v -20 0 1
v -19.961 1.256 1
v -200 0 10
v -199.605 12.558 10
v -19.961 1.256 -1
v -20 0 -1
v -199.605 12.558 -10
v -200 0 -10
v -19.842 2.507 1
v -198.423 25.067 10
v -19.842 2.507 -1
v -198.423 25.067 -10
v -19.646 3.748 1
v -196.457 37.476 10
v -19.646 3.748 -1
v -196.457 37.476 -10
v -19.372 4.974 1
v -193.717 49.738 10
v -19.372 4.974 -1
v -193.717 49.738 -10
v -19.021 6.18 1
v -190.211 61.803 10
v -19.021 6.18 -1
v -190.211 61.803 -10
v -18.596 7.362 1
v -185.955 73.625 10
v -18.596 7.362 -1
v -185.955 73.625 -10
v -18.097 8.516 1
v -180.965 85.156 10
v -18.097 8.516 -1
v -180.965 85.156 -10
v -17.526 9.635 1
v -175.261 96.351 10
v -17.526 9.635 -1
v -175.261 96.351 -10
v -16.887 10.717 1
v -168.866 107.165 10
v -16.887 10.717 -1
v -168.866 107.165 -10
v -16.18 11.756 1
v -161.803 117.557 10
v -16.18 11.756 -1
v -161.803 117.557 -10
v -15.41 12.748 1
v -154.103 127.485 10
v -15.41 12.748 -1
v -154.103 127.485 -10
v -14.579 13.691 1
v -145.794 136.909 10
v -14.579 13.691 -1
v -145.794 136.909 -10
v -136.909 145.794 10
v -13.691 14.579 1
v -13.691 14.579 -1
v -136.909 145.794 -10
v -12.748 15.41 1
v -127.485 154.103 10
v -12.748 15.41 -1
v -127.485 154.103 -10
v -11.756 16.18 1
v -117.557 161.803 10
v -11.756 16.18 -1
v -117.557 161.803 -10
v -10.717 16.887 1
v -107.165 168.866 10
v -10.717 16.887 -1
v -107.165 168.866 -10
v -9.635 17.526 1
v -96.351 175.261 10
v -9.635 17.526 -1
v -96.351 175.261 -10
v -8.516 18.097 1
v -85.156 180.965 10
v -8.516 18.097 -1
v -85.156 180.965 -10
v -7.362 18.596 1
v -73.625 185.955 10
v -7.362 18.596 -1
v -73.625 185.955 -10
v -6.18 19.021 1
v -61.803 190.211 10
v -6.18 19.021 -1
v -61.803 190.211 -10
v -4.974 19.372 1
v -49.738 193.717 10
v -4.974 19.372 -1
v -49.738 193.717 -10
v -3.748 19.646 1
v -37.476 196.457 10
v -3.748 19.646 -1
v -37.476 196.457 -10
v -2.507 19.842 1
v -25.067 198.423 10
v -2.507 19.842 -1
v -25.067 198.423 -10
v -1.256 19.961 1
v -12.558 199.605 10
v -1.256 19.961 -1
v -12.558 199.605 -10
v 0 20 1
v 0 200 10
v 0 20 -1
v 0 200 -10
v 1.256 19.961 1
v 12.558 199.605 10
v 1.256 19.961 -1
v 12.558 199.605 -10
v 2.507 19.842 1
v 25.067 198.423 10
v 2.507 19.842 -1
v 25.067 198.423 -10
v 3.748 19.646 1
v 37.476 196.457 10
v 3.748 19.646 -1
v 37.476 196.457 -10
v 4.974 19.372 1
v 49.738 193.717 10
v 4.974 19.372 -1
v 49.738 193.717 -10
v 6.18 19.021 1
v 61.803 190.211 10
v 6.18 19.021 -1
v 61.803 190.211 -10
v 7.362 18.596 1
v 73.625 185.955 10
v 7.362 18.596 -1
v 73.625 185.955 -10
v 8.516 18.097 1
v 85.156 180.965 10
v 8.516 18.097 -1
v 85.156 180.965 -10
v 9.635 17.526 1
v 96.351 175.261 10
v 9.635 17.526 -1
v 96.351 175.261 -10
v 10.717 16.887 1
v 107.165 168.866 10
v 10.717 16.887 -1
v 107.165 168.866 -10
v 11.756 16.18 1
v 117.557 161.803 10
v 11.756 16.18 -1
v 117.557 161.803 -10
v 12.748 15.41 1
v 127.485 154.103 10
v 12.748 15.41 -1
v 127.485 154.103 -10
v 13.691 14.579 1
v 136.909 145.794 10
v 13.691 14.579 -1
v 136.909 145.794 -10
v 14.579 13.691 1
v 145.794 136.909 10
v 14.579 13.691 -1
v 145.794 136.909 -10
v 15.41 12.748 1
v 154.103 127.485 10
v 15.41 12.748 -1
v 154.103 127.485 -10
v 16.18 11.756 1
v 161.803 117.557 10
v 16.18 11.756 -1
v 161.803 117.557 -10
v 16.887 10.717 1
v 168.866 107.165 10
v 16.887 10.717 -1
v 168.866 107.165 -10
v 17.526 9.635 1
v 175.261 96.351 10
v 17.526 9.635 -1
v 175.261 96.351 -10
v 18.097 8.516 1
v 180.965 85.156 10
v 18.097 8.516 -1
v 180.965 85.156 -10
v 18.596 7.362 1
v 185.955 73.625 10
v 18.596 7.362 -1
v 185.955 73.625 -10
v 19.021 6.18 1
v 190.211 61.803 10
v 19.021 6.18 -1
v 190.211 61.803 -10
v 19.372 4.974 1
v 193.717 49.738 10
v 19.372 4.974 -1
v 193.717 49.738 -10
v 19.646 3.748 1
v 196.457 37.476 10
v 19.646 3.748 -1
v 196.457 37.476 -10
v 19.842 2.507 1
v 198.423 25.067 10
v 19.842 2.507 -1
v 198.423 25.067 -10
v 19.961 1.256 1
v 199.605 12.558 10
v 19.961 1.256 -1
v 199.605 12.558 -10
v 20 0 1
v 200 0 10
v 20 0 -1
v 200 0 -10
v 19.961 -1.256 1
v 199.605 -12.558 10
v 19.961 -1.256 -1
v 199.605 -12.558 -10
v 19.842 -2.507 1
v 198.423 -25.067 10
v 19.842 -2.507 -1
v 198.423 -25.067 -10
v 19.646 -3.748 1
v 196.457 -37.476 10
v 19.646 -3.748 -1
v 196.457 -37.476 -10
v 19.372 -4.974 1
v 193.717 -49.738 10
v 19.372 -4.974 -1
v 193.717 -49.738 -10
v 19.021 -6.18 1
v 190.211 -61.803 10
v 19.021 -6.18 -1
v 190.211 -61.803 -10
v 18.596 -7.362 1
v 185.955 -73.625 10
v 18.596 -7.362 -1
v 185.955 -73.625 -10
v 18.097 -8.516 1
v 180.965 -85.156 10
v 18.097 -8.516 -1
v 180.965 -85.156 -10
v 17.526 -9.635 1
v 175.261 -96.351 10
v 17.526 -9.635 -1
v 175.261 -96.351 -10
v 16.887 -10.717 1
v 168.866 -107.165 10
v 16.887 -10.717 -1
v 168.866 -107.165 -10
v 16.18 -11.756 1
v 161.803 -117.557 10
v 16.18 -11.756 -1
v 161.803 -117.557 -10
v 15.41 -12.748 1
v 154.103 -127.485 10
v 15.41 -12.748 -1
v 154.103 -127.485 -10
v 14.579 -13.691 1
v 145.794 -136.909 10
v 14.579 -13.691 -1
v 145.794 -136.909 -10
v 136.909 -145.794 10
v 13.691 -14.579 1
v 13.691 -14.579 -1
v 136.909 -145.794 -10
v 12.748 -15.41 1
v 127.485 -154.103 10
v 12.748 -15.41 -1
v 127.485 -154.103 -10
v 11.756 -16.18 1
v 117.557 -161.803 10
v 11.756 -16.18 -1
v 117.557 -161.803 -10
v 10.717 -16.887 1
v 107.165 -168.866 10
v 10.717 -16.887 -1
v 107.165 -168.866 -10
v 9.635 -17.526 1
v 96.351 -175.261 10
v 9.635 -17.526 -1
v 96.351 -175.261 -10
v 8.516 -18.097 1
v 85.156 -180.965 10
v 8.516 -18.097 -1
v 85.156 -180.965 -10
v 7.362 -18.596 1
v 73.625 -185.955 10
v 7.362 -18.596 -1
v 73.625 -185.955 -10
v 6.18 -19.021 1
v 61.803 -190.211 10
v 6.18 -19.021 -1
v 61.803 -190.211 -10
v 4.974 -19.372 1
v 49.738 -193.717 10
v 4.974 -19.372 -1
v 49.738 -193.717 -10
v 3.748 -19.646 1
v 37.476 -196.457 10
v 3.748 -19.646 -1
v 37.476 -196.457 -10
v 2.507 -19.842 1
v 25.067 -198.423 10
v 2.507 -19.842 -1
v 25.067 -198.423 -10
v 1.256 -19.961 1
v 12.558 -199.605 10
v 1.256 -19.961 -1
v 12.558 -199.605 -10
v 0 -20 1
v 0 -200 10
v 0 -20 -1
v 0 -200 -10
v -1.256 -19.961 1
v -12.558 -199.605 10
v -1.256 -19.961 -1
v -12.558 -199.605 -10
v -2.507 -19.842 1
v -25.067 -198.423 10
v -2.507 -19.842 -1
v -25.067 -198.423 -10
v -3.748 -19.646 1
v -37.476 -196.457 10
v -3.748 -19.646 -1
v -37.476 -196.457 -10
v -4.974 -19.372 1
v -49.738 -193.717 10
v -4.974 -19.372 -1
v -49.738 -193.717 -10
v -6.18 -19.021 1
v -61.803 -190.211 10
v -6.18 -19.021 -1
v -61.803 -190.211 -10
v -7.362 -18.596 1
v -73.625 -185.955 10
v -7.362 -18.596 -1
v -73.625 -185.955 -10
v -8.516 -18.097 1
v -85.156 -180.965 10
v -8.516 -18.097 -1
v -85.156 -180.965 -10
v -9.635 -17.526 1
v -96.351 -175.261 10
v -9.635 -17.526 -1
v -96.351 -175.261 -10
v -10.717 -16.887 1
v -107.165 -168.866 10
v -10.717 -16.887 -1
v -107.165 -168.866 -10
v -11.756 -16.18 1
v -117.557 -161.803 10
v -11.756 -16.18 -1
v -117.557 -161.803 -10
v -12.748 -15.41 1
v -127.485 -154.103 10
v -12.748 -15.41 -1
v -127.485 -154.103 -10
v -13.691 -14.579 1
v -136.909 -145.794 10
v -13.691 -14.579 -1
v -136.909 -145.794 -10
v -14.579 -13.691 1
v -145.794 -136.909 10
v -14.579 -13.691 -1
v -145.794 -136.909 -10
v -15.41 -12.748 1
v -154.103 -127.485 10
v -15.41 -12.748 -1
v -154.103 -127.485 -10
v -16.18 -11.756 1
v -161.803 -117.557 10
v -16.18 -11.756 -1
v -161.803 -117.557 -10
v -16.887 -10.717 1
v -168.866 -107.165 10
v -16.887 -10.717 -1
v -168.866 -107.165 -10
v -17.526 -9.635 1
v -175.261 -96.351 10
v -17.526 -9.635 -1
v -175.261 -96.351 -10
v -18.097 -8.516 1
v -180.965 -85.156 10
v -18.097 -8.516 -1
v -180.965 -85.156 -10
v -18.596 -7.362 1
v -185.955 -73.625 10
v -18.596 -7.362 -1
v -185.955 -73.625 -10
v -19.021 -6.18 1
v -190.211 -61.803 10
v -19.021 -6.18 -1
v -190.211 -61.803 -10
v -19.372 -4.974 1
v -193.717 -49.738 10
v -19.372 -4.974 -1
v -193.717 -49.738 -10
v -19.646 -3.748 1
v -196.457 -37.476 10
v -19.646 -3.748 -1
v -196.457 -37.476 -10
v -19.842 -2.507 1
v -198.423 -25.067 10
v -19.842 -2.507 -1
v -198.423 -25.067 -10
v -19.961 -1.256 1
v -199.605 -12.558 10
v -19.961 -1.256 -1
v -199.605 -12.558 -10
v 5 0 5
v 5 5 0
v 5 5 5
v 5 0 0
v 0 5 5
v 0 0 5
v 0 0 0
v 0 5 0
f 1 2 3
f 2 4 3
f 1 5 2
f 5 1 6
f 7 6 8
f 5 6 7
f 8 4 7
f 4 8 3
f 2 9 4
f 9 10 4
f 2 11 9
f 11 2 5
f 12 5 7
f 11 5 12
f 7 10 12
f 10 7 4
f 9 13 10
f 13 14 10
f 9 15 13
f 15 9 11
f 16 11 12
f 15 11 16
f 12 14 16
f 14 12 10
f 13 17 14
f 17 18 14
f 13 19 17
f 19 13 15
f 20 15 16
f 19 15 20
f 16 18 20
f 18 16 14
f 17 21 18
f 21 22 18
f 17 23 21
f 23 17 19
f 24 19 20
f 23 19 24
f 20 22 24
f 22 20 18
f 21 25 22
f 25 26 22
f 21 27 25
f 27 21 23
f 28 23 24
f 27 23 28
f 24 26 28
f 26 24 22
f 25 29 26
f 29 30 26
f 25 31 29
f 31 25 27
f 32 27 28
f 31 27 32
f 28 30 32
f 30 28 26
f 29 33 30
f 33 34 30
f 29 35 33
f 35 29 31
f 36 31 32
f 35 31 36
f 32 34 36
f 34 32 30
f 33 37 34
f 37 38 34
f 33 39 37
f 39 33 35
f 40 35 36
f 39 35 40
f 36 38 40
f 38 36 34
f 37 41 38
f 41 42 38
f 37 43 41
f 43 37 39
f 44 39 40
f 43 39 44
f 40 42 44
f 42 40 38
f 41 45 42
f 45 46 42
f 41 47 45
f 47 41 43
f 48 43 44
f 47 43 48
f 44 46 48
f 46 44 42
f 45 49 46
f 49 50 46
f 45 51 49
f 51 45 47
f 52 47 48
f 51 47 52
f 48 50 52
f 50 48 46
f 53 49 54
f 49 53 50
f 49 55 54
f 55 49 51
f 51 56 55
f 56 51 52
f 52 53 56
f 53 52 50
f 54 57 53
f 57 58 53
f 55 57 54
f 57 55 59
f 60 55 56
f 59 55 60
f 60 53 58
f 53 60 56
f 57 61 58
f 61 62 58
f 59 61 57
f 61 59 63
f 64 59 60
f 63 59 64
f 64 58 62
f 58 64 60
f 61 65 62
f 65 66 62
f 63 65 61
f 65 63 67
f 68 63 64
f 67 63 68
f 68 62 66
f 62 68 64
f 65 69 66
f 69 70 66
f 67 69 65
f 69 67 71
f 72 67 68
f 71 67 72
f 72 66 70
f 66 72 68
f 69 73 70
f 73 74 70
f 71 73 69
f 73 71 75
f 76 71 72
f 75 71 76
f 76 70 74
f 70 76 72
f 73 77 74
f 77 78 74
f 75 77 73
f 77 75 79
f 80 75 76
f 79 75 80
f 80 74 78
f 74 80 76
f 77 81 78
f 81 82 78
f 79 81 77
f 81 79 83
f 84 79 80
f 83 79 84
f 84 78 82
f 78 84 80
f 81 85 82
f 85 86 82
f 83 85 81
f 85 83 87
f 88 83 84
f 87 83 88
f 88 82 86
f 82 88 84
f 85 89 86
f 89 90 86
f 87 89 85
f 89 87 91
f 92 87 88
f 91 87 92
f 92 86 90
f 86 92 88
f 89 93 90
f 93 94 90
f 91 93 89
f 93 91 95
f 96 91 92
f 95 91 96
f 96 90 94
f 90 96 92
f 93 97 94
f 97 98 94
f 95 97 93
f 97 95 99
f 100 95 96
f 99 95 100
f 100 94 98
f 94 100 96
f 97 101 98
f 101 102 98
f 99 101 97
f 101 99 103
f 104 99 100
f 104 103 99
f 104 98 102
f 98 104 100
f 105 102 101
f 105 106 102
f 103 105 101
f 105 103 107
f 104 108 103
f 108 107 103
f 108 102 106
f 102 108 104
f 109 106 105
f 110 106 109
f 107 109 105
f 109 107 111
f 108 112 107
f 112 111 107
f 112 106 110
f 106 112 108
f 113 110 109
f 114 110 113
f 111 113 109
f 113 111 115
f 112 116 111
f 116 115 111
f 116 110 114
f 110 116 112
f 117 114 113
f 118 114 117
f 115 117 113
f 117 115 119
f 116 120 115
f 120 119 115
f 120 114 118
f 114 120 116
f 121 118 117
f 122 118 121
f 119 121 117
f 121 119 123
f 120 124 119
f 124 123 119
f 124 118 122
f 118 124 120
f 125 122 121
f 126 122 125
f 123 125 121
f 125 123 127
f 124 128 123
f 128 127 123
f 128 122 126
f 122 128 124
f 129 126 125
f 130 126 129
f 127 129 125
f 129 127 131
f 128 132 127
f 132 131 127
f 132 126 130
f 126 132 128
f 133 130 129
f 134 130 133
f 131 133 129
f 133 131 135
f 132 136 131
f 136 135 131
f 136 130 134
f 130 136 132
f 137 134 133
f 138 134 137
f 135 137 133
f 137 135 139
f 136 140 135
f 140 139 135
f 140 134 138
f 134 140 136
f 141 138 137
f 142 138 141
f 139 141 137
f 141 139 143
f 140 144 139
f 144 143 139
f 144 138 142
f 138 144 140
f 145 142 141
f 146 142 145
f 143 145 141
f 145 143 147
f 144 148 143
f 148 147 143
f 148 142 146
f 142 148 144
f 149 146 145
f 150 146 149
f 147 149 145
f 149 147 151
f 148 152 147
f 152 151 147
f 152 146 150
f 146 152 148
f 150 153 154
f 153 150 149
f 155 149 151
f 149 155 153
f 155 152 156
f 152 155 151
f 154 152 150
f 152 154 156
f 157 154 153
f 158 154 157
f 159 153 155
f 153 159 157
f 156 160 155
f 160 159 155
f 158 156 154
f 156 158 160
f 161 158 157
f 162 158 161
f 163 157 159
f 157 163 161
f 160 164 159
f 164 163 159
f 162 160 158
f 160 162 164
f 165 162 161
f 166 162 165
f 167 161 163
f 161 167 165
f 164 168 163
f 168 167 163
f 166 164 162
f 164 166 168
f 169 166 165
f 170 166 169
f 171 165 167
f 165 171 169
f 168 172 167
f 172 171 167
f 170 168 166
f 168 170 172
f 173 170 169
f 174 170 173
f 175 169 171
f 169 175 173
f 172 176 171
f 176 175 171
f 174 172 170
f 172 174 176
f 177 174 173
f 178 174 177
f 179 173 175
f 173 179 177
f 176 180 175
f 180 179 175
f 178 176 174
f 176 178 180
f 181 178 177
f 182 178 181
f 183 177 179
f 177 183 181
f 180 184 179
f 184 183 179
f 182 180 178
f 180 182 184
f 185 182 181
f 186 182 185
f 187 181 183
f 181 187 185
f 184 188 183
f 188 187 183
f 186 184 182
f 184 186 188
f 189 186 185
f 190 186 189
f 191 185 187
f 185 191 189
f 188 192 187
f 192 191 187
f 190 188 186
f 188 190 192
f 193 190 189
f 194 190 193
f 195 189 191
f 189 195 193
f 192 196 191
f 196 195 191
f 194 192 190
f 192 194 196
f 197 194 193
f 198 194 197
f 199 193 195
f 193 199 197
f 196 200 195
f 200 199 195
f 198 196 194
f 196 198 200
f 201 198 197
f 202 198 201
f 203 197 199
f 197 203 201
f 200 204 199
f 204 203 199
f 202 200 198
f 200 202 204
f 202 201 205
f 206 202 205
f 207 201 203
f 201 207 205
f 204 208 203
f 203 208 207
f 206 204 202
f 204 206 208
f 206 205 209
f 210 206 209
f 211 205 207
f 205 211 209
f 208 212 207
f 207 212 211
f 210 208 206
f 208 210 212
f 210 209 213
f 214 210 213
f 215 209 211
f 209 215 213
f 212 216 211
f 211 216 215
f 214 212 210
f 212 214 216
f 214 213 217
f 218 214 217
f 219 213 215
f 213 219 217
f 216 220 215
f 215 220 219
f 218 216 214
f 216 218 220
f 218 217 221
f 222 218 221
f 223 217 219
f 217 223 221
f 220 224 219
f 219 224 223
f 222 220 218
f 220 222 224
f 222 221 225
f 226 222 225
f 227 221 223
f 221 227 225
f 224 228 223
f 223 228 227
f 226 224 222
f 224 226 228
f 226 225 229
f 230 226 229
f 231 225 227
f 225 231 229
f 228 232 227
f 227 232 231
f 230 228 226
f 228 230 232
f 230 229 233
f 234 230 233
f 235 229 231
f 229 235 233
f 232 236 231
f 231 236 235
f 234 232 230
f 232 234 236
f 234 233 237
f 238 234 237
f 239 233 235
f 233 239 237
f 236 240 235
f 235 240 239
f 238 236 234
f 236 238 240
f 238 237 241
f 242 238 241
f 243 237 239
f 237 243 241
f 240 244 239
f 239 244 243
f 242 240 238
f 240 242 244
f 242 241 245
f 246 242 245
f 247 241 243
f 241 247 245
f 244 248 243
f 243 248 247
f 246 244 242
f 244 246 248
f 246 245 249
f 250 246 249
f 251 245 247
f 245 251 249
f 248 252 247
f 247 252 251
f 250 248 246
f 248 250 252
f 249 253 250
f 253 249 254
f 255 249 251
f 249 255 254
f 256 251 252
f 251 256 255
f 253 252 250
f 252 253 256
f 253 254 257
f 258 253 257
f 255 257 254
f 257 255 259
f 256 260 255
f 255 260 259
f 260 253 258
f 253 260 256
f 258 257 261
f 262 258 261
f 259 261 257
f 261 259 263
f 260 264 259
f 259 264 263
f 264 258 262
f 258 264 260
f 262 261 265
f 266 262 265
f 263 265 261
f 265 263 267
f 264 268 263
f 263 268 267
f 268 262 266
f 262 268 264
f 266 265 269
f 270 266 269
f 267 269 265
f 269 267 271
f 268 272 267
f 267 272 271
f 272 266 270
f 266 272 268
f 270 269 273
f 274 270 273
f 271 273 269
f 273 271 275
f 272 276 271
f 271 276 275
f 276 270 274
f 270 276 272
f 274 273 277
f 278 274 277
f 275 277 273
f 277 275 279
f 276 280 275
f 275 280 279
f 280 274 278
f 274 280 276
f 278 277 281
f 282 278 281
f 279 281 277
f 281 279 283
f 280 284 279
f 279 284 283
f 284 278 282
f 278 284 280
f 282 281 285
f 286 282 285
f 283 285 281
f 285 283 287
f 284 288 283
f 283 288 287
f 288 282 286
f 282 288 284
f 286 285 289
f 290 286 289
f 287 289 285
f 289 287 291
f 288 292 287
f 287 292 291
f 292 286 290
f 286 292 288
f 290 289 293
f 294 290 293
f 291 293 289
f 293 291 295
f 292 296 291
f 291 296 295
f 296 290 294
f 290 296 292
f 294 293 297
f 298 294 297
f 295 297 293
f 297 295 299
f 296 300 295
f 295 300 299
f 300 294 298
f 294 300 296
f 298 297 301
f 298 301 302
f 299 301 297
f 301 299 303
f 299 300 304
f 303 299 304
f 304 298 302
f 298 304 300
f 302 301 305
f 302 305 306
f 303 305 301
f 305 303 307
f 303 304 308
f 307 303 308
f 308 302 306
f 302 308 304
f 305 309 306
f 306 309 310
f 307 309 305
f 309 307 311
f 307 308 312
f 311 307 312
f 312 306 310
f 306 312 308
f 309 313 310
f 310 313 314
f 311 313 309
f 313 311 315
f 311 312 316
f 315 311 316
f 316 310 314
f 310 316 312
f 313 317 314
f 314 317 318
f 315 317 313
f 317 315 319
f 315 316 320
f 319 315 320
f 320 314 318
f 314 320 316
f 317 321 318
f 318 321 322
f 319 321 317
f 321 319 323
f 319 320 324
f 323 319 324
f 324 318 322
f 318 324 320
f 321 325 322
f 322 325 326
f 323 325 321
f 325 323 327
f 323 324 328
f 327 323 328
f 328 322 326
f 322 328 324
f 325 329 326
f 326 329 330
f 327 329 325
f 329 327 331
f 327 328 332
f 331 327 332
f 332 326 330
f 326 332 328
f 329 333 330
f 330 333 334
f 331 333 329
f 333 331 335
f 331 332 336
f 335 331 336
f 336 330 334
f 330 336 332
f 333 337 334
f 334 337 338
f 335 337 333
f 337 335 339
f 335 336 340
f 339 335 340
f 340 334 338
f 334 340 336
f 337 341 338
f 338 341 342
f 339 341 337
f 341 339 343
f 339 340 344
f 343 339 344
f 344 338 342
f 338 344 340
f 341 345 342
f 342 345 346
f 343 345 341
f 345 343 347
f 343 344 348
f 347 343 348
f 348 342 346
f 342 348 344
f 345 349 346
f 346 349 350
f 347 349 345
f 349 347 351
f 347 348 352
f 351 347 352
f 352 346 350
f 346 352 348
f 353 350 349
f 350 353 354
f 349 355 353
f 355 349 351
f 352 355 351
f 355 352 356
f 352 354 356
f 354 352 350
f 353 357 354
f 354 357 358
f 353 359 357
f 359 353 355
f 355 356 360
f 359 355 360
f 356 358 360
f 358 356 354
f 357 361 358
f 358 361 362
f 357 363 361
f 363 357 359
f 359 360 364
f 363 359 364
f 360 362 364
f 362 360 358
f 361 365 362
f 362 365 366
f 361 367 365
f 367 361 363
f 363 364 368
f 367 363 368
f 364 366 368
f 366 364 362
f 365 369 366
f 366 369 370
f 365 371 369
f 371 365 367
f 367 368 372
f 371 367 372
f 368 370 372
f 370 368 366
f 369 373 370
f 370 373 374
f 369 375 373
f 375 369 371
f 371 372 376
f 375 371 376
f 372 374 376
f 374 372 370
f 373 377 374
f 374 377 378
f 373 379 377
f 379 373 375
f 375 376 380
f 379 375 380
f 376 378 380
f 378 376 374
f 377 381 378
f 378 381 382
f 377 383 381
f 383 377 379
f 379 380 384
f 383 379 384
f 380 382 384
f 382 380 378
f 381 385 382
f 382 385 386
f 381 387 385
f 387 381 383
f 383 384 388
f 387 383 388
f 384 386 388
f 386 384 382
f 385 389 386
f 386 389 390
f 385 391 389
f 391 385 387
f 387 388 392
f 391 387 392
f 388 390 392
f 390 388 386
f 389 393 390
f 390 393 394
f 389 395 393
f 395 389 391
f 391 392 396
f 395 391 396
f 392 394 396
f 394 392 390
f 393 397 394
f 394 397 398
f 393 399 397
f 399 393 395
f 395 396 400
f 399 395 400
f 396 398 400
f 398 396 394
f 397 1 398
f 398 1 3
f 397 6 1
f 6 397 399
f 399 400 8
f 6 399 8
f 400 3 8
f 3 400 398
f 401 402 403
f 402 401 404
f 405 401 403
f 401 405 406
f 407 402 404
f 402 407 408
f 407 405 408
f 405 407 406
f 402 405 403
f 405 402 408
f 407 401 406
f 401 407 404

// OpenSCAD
// CSG.scad - Basic example of CSG usage

 rotate_extrude(angle=360, convexity=2, $fn=100){
	  difference()
 {
 polygon(points=[[0,0],[200,10],[200,-10]]);
	 
 polygon(points=[[0,0],[20,10],[20,-10]]);
	 	 
 }
 }
 
 cube(5)
echo(version=version());
// Written by Marius Kintel <marius@kintel.net>
//
// To the extent possible under law, the author(s) have dedicated all
// copyright and related and neighboring rights to this software to the
// public domain worldwide. This software is distributed without any
// warranty.
//
// You should have received a copy of the CC0 Public Domain
// Dedication along with this software.
// If not, see <http://creativecommons.org/publicdomain/zero/1.0/>.
